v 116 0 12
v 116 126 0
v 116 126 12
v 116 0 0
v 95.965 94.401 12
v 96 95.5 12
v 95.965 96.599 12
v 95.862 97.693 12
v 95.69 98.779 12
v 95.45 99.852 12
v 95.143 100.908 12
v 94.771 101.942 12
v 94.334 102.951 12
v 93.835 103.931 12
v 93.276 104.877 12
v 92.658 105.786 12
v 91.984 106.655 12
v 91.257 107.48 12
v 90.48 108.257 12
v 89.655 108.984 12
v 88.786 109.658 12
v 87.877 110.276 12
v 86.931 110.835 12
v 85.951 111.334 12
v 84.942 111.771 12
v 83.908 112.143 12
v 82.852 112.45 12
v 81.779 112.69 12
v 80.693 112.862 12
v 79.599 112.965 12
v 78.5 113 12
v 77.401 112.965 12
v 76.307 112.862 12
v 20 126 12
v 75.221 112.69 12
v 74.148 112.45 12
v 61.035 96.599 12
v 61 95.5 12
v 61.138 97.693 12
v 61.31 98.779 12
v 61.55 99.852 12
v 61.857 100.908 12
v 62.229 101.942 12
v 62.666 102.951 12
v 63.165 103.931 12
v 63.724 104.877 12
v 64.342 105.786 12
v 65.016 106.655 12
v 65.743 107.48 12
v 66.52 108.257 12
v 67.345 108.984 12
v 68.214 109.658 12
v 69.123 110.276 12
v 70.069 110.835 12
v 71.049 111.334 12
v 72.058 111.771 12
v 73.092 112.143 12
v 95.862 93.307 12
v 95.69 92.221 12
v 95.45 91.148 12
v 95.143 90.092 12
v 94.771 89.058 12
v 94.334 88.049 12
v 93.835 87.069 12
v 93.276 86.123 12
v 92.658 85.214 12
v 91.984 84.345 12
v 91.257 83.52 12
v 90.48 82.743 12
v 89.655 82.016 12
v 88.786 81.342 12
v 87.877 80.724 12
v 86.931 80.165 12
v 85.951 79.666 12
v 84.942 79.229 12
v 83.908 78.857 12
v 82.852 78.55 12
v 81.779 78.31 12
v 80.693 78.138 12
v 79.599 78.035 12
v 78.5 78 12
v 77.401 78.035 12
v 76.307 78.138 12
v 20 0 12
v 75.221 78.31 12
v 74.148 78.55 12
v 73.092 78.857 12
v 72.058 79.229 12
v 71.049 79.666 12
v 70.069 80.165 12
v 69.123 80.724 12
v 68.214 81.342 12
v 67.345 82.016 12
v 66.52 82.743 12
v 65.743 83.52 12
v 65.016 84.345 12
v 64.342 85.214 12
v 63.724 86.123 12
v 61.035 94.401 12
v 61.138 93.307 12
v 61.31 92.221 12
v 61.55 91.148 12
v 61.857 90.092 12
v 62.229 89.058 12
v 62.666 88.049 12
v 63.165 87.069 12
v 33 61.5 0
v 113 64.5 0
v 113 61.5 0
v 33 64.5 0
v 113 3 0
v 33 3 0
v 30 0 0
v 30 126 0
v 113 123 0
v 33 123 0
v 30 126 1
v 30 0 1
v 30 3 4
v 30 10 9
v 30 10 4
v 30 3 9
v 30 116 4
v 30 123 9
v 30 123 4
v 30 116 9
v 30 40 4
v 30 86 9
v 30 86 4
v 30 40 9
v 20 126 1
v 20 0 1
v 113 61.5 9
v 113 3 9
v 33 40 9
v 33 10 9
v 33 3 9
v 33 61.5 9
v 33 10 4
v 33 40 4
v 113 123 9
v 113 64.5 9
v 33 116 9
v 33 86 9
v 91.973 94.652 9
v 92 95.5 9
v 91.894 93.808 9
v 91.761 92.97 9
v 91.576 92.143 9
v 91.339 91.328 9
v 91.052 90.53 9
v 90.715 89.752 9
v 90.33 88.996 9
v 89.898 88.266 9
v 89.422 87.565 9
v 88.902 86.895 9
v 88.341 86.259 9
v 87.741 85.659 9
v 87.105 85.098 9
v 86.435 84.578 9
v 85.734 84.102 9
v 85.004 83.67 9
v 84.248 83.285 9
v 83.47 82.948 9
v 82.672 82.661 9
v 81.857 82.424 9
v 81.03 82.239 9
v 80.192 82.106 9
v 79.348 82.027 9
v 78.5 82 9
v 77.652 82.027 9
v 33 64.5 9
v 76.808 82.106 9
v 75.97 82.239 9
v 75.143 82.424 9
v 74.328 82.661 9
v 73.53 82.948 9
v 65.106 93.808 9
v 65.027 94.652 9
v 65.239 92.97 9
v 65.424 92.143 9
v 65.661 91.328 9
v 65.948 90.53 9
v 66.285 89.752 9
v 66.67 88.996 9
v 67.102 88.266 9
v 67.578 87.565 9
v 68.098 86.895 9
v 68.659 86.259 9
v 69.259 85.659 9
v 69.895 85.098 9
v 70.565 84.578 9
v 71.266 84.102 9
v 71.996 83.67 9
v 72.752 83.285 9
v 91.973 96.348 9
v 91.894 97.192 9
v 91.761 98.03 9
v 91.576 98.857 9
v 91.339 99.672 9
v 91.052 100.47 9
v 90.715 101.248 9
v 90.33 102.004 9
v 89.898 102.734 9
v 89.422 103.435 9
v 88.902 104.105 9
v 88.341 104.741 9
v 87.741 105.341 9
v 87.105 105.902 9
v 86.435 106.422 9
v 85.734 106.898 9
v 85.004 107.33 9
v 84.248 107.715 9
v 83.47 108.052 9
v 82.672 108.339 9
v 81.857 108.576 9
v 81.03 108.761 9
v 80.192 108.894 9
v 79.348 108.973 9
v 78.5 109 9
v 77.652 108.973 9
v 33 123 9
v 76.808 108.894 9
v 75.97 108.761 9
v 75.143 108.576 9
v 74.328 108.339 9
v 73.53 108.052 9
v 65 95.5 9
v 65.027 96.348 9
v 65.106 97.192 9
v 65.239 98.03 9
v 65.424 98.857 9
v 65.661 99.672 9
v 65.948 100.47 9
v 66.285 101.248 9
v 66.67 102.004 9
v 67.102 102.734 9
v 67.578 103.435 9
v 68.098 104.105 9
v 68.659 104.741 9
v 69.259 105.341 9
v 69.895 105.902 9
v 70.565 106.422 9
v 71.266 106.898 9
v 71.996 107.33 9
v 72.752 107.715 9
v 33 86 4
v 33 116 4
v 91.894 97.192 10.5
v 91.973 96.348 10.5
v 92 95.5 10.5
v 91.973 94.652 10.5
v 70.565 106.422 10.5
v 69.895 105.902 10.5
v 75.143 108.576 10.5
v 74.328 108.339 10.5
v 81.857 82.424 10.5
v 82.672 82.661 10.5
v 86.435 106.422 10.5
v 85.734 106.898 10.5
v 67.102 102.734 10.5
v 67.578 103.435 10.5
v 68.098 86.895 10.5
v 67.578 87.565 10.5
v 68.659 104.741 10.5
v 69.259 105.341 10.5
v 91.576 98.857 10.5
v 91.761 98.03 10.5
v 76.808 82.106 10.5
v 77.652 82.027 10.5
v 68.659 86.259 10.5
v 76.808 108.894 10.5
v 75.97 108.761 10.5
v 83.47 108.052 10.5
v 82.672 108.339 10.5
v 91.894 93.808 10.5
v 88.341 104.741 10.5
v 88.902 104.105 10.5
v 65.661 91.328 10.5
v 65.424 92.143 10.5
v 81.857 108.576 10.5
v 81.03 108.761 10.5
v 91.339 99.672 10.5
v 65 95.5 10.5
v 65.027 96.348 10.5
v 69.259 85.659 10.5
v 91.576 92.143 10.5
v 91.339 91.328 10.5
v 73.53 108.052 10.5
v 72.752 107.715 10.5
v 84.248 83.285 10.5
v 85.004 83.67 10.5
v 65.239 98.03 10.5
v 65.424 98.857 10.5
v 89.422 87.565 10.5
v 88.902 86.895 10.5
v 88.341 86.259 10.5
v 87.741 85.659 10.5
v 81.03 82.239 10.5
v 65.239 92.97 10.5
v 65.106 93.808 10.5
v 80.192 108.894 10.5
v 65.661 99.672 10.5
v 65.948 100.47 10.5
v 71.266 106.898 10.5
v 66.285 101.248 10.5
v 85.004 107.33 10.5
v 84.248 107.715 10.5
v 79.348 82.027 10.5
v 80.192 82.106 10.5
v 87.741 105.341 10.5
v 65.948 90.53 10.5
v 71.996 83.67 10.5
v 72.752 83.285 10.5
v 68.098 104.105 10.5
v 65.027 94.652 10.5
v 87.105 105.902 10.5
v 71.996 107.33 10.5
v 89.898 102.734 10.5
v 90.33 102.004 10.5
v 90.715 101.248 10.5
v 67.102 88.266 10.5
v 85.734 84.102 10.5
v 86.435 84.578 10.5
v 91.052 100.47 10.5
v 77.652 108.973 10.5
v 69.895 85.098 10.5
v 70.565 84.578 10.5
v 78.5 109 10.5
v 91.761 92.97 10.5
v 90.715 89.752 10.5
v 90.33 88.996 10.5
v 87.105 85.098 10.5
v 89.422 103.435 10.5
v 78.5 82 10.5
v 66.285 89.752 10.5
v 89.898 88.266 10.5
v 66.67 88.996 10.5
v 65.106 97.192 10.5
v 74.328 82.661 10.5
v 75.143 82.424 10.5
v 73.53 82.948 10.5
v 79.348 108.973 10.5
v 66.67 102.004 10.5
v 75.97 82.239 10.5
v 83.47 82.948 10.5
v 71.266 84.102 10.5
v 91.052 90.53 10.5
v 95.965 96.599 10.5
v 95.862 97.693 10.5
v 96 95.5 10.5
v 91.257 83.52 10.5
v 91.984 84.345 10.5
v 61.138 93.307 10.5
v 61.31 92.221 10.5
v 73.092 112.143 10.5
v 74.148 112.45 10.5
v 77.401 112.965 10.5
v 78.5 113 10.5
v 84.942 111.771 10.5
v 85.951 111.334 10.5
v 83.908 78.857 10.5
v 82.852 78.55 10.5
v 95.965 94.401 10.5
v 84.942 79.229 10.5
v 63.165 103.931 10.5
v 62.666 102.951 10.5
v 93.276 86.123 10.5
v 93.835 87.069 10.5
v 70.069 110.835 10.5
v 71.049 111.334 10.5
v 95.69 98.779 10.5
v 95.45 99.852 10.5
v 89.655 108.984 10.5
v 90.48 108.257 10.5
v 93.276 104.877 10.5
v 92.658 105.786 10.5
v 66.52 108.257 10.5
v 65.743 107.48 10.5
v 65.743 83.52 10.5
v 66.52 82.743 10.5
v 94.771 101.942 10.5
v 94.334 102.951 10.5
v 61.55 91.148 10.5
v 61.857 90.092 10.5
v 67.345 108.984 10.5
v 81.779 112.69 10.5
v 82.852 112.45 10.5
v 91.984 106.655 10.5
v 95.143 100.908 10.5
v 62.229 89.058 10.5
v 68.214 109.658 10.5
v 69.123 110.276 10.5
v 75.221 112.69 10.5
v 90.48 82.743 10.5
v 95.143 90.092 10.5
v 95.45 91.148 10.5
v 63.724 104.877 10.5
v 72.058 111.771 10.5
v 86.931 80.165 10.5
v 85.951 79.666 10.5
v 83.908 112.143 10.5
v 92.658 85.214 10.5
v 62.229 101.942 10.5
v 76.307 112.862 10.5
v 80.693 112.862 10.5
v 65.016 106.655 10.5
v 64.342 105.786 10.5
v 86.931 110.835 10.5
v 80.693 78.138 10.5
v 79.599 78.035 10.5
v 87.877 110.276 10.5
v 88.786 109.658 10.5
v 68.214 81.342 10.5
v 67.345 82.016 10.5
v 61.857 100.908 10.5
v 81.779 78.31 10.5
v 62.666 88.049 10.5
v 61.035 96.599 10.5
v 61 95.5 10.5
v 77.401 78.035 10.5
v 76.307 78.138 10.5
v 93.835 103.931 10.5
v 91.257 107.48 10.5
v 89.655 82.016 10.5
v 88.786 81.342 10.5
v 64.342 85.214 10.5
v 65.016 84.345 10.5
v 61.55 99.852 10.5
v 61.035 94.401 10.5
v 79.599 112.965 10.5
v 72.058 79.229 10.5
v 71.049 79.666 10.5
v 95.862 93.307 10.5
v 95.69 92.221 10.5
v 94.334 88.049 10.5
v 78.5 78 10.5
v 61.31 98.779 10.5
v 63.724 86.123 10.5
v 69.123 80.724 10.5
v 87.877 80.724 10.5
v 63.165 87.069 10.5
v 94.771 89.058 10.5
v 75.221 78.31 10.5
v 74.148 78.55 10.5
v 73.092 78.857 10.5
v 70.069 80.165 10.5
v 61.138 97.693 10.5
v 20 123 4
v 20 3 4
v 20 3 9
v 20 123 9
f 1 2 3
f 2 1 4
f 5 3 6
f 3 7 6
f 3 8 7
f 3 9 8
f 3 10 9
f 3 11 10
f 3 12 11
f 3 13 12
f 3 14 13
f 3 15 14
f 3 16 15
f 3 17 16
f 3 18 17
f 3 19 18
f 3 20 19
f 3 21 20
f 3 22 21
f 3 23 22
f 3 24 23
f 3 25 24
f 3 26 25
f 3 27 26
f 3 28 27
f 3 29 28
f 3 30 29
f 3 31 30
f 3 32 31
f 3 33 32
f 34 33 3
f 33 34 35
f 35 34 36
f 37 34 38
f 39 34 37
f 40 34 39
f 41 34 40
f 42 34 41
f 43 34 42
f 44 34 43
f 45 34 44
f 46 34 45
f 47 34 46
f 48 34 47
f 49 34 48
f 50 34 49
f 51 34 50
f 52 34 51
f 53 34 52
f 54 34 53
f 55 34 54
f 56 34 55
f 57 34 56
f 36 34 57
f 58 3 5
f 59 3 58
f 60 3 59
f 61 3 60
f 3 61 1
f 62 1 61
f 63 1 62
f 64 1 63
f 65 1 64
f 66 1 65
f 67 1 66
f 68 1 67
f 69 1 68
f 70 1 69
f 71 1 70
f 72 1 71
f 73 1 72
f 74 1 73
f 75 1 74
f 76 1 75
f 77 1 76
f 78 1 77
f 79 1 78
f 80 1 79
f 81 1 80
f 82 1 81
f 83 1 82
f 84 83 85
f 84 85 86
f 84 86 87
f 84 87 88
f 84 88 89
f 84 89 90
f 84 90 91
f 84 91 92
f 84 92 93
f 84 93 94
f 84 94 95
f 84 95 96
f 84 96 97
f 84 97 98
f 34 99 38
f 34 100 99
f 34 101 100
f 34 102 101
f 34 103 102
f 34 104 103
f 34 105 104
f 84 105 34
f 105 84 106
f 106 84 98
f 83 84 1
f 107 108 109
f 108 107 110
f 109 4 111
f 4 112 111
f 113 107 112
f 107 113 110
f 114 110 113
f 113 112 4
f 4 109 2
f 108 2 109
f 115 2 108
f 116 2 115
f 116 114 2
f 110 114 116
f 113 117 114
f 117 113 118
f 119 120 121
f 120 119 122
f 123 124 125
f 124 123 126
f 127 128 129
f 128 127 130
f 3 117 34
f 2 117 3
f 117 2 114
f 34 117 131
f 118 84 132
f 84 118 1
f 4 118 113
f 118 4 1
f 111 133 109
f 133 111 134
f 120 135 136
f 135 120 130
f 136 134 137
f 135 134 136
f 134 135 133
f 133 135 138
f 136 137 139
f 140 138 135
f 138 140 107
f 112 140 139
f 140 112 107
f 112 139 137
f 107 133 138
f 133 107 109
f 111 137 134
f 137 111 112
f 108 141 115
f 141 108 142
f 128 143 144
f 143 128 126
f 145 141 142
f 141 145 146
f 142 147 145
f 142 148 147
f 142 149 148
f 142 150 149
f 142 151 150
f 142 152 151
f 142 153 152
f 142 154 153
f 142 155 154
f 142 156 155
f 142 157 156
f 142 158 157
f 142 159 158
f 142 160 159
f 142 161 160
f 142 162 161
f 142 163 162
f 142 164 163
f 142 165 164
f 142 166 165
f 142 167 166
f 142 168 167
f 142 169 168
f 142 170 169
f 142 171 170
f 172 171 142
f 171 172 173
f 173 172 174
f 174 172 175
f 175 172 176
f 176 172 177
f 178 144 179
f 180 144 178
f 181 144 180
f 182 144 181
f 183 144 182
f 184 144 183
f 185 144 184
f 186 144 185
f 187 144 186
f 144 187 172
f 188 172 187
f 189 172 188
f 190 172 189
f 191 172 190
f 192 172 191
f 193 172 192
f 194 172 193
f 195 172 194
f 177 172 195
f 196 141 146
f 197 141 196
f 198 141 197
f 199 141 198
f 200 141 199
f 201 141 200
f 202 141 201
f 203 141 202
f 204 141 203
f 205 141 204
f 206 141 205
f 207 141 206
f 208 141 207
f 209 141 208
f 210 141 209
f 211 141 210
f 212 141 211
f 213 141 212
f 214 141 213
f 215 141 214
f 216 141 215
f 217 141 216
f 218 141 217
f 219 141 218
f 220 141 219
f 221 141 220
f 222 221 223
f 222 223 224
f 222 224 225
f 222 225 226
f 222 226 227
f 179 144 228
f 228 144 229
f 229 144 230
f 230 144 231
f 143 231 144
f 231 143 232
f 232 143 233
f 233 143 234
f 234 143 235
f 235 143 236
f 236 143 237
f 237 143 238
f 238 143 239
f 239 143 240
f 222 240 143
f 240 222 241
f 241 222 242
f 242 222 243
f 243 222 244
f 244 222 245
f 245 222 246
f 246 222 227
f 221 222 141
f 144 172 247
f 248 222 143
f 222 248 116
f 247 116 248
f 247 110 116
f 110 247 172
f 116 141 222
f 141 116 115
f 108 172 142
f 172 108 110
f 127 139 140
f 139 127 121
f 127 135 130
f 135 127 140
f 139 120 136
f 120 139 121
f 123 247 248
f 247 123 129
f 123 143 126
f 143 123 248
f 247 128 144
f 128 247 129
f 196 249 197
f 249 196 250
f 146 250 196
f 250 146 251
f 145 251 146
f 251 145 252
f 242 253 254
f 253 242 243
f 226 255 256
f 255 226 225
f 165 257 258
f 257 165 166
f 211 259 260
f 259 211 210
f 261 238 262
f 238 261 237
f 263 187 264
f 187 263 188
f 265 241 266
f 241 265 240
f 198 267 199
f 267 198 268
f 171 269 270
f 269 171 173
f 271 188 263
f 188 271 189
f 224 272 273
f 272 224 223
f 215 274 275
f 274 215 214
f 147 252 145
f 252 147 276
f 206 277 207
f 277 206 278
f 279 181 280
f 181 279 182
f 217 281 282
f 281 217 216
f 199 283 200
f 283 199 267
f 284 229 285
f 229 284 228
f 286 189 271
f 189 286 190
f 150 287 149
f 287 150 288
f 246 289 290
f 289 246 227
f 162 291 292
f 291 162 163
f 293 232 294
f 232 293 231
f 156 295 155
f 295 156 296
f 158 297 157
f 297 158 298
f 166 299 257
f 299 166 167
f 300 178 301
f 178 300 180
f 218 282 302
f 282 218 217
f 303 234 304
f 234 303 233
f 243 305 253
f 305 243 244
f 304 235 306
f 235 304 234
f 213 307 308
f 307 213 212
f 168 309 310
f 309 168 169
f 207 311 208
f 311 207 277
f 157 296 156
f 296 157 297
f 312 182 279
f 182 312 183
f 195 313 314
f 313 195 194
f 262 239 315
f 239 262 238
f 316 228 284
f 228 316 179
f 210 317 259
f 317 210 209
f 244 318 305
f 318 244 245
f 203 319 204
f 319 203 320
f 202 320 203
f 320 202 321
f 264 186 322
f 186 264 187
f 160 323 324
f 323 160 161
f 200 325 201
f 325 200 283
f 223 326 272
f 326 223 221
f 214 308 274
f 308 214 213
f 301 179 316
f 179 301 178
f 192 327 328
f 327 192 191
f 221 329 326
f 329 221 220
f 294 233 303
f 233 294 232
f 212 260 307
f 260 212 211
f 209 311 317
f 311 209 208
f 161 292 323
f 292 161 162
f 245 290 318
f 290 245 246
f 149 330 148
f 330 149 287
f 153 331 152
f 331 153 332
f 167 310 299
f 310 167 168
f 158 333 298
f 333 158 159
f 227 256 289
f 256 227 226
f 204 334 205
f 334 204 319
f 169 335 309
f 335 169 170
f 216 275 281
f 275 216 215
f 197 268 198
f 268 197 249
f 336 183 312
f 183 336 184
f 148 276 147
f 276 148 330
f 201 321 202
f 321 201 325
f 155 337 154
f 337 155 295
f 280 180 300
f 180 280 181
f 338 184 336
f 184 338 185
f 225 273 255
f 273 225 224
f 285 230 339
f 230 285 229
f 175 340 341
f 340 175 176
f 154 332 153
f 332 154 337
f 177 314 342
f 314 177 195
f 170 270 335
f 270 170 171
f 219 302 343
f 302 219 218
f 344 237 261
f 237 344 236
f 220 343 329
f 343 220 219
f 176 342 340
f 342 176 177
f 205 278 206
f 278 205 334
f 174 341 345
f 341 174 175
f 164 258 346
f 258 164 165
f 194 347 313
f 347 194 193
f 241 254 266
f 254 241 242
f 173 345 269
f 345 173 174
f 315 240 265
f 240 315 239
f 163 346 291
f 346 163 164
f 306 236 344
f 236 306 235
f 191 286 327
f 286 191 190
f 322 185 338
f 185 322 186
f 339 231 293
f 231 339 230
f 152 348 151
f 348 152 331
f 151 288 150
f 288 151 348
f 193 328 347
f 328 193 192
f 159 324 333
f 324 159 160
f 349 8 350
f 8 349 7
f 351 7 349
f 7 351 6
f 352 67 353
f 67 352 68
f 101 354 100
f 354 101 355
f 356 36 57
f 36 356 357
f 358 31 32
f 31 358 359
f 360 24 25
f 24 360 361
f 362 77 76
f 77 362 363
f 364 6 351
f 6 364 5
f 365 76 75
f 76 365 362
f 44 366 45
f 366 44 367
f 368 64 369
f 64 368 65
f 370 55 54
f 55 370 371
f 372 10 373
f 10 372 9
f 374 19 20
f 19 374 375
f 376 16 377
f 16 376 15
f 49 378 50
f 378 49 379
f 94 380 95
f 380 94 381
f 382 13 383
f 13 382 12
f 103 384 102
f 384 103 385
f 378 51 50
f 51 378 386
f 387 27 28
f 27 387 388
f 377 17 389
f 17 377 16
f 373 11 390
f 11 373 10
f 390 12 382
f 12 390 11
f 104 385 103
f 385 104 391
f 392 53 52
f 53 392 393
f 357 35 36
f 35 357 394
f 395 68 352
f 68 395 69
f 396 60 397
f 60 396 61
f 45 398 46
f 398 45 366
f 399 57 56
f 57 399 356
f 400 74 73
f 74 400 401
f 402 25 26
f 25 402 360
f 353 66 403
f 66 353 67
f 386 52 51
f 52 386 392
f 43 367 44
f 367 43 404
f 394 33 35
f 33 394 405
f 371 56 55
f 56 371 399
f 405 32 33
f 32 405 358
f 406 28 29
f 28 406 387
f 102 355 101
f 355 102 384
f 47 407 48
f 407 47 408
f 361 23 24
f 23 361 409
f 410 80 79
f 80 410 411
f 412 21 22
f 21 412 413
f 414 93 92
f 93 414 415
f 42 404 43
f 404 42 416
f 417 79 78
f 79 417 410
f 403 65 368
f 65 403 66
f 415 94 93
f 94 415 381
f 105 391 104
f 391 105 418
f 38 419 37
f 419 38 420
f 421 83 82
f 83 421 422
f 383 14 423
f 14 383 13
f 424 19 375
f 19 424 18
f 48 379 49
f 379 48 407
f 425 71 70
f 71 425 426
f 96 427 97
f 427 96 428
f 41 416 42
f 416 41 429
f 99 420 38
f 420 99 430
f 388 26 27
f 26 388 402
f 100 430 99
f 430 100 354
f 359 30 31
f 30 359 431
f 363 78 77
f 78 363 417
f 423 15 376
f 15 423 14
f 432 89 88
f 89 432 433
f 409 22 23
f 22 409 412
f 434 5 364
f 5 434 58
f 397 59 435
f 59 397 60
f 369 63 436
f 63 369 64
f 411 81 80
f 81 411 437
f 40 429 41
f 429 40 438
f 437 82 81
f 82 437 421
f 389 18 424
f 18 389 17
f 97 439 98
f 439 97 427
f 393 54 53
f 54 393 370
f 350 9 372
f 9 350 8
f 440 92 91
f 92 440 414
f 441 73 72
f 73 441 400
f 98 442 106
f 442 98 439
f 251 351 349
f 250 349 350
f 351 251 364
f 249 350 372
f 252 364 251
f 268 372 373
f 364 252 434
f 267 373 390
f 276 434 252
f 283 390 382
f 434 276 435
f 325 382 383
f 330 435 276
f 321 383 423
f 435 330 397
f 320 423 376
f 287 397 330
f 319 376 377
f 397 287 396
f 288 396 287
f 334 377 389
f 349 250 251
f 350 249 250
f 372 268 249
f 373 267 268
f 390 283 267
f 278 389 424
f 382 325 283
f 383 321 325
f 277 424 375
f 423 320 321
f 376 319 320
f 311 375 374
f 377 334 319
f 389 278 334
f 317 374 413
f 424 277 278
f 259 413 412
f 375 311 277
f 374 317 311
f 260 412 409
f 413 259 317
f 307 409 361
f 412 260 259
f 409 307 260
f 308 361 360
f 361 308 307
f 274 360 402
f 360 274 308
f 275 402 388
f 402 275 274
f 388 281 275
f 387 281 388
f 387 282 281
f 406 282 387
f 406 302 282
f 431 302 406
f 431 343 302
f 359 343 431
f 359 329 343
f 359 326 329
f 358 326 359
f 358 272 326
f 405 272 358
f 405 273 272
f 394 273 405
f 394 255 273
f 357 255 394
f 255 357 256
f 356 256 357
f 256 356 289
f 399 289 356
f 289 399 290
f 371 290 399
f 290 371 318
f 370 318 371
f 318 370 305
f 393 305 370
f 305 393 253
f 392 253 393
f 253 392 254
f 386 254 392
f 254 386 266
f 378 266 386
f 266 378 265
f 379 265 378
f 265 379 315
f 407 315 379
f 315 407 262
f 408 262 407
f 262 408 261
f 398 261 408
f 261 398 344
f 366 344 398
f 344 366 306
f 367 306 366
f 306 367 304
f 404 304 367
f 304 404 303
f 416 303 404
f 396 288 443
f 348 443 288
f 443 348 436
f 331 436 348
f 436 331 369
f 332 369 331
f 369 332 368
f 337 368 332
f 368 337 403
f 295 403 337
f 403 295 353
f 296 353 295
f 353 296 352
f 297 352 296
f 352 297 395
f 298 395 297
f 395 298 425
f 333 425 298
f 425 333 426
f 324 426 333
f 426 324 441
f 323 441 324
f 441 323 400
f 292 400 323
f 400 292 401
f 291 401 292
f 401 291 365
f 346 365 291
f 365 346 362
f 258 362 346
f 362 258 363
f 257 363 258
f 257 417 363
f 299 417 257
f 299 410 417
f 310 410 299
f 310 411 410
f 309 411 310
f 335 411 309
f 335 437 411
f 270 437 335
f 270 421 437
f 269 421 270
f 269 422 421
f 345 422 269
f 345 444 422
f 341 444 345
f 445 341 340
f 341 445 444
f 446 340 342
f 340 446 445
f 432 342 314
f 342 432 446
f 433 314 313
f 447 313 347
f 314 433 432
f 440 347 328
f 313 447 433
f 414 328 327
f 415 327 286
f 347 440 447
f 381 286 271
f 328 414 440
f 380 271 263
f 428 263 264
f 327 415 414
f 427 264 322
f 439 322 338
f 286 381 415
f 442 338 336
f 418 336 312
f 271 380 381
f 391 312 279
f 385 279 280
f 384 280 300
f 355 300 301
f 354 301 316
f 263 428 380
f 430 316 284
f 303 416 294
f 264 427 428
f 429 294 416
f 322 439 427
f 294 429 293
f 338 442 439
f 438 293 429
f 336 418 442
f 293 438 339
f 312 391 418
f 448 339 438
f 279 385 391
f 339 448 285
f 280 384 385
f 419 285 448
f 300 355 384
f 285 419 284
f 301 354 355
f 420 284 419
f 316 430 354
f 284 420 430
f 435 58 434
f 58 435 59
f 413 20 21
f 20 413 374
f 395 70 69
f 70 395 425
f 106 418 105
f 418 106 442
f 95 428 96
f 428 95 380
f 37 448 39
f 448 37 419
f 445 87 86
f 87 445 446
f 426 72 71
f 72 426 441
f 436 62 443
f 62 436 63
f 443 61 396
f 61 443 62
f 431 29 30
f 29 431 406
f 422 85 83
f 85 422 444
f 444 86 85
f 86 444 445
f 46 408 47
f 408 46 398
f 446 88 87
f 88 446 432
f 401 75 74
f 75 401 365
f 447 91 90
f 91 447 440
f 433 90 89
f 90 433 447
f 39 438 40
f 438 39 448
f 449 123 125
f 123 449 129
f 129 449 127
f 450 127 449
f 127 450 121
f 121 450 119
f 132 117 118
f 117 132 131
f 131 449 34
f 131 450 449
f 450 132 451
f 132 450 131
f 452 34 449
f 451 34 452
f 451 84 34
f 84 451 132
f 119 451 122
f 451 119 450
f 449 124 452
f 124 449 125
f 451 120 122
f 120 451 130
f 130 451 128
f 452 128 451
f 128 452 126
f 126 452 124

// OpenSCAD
module connector(length=10, width=200, space=6, deep=10){
translate([20,0,0])    
cube([length,width,thick]);

translate([length+10,0,0])
    cube([deep,3,4+space]);
translate([length+10,width-thick,0])
    cube([deep,3,4+2]);
}

space=6;
mcx = 100;
mcy = 63;
mcz = 70+space;
thick = 3;
imcx = mcx-2*thick;
imcy = mcy-2*thick;
imcz = mcz-2*thick;
fr=17.5;
ifr=13.5;
hf=2;

difference(){
translate([30,0,0])
color("blue")
cube([86,mcy*2,space+6]);
    translate([33,3,-3])
cube([80,58.5,space+6]);
    translate([33,3+58.5+3,-3])
cube([80,58.5,space+6]);
//apertura derecha
    translate([29,10,4])
cube([5,30,5]);
//apertura izq
translate([29,(2*mcy)-40,4])
cube([5,30,5]);
    
     translate([33+83-fr-20,(2*mcy)-fr-3-10,13]) cylinder(r=ifr,h=10, $fn=100, center= true);
    translate([33+83-fr-20,(2*mcy)-fr-3-10,12.5])  cylinder(r=fr,h=4, $fn=100, center= true);
}

translate ([0,0,1]) 
connector(width=2*mcy, lenght=(80+30+3));
mirror([0,0,1])  
translate([0,0,-(6+space)])
connector(width=2*mcy);

//translate ([0,62-25,0])
//cube([33+83,50,7]);
//cube([33+83,12,100]);
